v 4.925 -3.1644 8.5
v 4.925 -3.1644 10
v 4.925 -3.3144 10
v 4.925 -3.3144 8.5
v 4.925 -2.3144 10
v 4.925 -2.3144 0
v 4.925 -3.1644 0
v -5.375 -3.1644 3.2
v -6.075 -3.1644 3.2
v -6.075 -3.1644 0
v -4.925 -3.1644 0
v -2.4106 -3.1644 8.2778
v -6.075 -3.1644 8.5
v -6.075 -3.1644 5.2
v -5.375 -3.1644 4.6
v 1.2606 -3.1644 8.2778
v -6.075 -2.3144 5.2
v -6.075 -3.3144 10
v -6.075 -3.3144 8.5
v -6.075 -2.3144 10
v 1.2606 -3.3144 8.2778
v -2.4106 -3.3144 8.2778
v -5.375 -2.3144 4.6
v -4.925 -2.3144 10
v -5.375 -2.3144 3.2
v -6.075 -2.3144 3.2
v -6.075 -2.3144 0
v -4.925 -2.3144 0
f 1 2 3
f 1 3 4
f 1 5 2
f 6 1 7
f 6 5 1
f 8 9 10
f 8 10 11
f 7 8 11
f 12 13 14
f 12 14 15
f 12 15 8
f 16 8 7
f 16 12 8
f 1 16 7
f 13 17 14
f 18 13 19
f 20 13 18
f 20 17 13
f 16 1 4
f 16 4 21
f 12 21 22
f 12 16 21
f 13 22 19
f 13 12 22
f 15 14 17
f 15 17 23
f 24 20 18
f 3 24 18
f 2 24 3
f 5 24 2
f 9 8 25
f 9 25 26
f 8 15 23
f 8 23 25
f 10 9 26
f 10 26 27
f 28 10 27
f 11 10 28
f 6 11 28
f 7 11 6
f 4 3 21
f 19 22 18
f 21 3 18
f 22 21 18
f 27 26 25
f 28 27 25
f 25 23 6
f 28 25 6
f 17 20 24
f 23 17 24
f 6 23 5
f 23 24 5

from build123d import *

# Parameters (mm, degrees)
SKETCH1_W           = 9.849999945
SKETCH1_H           = 0.849999995
BOSS_EXTRUDE1_DEPTH = 10
BOSS_EXTRUDE2_DEPTH = 0.849999995
BOSS_EXTRUDE3_DEPTH = 0.150000005


with BuildPart() as part:
    # Sketch1 → Boss-Extrude1 (new body)
    with BuildSketch(Plane.XY):
        with Locations((2.94e-07, -2.739426966)):
            Rectangle(SKETCH1_W, SKETCH1_H)
    extrude(amount=BOSS_EXTRUDE1_DEPTH)

    # Sketch3 → Boss-Extrude2 (add)
    with BuildSketch(Plane.XZ.offset(3.164426964)):
        Polygon((-4.924999678, 0), (-4.924999678, 10), (-6.074999733, 10), (-6.074999733, 5.2), (-5.374999733, 4.6), (-5.374999733, 3.2), (-6.074999733, 3.2), (-6.074999733, 0), align=None)
    extrude(amount=-BOSS_EXTRUDE2_DEPTH)

    # Sketch4 → Boss-Extrude3 (add)
    with BuildSketch(Plane.XZ.offset(3.164426964)):
        with BuildLine():
            Line((-6.074999733, 10), (4.925000267, 10))
            Line((4.925000267, 10), (4.925000267, 8.5))
            ThreePointArc((4.925000267, 8.5), (-0.574999733, 8.25), (-6.074999733, 8.5))
            Line((-6.074999733, 8.5), (-6.074999733, 10))
        make_face()
    extrude(amount=BOSS_EXTRUDE3_DEPTH)


solid = part.part
